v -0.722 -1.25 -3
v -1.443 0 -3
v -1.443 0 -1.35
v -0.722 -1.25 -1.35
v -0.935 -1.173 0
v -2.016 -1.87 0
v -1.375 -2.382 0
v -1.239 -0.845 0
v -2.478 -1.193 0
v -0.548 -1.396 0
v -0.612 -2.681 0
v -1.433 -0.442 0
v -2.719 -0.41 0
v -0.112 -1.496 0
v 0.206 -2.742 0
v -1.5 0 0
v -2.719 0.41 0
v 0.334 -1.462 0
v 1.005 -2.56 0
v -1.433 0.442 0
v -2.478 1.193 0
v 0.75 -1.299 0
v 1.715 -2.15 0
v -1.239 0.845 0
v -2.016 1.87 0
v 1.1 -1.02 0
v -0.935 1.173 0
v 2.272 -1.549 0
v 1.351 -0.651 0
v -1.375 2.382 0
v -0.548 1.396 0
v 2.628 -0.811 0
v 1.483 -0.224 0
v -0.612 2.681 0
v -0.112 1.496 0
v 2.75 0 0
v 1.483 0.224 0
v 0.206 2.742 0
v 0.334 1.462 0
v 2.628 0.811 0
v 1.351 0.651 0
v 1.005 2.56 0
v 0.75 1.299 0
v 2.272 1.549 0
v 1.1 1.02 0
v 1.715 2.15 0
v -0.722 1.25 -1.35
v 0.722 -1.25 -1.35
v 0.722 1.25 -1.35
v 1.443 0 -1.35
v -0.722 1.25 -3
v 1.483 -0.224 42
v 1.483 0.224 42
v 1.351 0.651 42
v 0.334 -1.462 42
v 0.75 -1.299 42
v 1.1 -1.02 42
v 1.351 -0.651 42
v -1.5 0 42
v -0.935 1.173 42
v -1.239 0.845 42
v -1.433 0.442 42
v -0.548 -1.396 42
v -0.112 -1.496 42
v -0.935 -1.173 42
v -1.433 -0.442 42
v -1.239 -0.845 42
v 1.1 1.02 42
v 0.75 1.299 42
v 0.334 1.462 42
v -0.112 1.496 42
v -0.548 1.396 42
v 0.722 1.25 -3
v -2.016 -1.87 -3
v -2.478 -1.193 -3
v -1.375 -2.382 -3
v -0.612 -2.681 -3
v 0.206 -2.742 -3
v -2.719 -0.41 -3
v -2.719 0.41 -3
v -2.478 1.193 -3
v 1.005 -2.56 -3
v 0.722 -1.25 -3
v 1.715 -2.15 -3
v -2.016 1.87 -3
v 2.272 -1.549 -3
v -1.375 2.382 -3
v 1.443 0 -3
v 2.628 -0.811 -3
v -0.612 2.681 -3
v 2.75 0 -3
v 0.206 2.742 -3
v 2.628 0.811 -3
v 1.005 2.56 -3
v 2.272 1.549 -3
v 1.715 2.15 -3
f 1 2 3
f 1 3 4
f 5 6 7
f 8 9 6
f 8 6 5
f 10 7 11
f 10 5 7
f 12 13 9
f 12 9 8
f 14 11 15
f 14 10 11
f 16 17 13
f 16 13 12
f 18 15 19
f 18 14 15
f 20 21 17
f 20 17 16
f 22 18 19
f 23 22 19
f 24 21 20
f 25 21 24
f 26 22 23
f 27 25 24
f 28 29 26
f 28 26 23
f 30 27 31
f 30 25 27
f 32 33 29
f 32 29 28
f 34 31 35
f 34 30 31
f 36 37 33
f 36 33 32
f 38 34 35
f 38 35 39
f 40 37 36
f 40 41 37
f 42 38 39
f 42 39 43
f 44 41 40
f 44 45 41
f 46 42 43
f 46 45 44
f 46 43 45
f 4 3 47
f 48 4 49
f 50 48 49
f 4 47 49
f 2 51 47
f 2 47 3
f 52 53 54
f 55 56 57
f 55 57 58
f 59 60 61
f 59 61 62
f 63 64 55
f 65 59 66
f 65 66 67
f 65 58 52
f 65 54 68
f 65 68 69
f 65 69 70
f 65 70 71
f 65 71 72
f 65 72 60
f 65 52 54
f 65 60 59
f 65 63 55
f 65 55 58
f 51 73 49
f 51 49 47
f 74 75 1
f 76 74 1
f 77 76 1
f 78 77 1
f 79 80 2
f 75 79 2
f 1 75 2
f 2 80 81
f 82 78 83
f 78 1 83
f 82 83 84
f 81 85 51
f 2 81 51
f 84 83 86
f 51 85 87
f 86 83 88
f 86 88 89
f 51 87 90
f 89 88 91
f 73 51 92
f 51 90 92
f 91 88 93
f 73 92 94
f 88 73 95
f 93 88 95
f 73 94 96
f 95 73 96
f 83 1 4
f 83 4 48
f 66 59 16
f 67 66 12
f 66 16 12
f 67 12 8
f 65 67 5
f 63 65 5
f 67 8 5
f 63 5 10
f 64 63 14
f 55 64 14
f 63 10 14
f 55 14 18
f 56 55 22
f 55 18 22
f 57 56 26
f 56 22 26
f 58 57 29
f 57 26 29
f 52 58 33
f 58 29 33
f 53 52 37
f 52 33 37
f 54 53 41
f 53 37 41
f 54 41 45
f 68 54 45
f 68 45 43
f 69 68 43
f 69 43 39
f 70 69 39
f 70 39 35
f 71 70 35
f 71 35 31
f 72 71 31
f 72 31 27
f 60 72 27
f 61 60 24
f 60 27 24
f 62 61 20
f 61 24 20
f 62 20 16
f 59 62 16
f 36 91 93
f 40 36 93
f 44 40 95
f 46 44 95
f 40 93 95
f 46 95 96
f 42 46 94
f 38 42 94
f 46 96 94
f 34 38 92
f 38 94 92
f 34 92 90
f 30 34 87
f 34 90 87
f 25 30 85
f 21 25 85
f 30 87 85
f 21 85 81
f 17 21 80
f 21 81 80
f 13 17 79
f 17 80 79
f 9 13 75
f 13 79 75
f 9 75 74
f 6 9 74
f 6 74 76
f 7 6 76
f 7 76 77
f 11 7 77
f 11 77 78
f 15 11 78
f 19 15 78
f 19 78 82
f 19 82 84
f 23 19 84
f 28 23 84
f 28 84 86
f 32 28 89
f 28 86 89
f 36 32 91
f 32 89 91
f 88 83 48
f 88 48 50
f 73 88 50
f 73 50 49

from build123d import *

# Parameters (mm, degrees)
F_01_START                = -3
S01_HEAD_R                = 2.75
F_01_HEAD_DEPTH           = 3
S02_NOMINAL_SHANK_R       = 1.5
F_02_NOMINAL_SHANK_DEPTH  = 42
F_03_START                = -3.1
F_03_HEX_KEY_SOCKET_DEPTH = 1.75


with BuildPart() as part:
    # S01 - Head → 01 - Head (new body)
    with BuildSketch(Plane.XY.offset(F_01_START)):
        Circle(S01_HEAD_R)
    extrude(amount=F_01_HEAD_DEPTH)

    # S02 - Nominal shank → 02 - Nominal shank (add)
    with BuildSketch(Plane.XY):
        with Locations(Location((0, 0, 0), (0, 0, 180))):
            Circle(S02_NOMINAL_SHANK_R)
    extrude(amount=F_02_NOMINAL_SHANK_DEPTH)

    # S03 - Hex key socket → 03 - Hex key socket (cut)
    with BuildSketch(Plane.XY.offset(F_03_START)):
        Polygon((1.443375673, 0), (0.721687836, 1.25), (-0.721687836, 1.25), (-1.443375673, 0), (-0.721687836, -1.25), (0.721687836, -1.25), align=None)
    extrude(amount=F_03_HEX_KEY_SOCKET_DEPTH, mode=Mode.SUBTRACT)


solid = part.part
